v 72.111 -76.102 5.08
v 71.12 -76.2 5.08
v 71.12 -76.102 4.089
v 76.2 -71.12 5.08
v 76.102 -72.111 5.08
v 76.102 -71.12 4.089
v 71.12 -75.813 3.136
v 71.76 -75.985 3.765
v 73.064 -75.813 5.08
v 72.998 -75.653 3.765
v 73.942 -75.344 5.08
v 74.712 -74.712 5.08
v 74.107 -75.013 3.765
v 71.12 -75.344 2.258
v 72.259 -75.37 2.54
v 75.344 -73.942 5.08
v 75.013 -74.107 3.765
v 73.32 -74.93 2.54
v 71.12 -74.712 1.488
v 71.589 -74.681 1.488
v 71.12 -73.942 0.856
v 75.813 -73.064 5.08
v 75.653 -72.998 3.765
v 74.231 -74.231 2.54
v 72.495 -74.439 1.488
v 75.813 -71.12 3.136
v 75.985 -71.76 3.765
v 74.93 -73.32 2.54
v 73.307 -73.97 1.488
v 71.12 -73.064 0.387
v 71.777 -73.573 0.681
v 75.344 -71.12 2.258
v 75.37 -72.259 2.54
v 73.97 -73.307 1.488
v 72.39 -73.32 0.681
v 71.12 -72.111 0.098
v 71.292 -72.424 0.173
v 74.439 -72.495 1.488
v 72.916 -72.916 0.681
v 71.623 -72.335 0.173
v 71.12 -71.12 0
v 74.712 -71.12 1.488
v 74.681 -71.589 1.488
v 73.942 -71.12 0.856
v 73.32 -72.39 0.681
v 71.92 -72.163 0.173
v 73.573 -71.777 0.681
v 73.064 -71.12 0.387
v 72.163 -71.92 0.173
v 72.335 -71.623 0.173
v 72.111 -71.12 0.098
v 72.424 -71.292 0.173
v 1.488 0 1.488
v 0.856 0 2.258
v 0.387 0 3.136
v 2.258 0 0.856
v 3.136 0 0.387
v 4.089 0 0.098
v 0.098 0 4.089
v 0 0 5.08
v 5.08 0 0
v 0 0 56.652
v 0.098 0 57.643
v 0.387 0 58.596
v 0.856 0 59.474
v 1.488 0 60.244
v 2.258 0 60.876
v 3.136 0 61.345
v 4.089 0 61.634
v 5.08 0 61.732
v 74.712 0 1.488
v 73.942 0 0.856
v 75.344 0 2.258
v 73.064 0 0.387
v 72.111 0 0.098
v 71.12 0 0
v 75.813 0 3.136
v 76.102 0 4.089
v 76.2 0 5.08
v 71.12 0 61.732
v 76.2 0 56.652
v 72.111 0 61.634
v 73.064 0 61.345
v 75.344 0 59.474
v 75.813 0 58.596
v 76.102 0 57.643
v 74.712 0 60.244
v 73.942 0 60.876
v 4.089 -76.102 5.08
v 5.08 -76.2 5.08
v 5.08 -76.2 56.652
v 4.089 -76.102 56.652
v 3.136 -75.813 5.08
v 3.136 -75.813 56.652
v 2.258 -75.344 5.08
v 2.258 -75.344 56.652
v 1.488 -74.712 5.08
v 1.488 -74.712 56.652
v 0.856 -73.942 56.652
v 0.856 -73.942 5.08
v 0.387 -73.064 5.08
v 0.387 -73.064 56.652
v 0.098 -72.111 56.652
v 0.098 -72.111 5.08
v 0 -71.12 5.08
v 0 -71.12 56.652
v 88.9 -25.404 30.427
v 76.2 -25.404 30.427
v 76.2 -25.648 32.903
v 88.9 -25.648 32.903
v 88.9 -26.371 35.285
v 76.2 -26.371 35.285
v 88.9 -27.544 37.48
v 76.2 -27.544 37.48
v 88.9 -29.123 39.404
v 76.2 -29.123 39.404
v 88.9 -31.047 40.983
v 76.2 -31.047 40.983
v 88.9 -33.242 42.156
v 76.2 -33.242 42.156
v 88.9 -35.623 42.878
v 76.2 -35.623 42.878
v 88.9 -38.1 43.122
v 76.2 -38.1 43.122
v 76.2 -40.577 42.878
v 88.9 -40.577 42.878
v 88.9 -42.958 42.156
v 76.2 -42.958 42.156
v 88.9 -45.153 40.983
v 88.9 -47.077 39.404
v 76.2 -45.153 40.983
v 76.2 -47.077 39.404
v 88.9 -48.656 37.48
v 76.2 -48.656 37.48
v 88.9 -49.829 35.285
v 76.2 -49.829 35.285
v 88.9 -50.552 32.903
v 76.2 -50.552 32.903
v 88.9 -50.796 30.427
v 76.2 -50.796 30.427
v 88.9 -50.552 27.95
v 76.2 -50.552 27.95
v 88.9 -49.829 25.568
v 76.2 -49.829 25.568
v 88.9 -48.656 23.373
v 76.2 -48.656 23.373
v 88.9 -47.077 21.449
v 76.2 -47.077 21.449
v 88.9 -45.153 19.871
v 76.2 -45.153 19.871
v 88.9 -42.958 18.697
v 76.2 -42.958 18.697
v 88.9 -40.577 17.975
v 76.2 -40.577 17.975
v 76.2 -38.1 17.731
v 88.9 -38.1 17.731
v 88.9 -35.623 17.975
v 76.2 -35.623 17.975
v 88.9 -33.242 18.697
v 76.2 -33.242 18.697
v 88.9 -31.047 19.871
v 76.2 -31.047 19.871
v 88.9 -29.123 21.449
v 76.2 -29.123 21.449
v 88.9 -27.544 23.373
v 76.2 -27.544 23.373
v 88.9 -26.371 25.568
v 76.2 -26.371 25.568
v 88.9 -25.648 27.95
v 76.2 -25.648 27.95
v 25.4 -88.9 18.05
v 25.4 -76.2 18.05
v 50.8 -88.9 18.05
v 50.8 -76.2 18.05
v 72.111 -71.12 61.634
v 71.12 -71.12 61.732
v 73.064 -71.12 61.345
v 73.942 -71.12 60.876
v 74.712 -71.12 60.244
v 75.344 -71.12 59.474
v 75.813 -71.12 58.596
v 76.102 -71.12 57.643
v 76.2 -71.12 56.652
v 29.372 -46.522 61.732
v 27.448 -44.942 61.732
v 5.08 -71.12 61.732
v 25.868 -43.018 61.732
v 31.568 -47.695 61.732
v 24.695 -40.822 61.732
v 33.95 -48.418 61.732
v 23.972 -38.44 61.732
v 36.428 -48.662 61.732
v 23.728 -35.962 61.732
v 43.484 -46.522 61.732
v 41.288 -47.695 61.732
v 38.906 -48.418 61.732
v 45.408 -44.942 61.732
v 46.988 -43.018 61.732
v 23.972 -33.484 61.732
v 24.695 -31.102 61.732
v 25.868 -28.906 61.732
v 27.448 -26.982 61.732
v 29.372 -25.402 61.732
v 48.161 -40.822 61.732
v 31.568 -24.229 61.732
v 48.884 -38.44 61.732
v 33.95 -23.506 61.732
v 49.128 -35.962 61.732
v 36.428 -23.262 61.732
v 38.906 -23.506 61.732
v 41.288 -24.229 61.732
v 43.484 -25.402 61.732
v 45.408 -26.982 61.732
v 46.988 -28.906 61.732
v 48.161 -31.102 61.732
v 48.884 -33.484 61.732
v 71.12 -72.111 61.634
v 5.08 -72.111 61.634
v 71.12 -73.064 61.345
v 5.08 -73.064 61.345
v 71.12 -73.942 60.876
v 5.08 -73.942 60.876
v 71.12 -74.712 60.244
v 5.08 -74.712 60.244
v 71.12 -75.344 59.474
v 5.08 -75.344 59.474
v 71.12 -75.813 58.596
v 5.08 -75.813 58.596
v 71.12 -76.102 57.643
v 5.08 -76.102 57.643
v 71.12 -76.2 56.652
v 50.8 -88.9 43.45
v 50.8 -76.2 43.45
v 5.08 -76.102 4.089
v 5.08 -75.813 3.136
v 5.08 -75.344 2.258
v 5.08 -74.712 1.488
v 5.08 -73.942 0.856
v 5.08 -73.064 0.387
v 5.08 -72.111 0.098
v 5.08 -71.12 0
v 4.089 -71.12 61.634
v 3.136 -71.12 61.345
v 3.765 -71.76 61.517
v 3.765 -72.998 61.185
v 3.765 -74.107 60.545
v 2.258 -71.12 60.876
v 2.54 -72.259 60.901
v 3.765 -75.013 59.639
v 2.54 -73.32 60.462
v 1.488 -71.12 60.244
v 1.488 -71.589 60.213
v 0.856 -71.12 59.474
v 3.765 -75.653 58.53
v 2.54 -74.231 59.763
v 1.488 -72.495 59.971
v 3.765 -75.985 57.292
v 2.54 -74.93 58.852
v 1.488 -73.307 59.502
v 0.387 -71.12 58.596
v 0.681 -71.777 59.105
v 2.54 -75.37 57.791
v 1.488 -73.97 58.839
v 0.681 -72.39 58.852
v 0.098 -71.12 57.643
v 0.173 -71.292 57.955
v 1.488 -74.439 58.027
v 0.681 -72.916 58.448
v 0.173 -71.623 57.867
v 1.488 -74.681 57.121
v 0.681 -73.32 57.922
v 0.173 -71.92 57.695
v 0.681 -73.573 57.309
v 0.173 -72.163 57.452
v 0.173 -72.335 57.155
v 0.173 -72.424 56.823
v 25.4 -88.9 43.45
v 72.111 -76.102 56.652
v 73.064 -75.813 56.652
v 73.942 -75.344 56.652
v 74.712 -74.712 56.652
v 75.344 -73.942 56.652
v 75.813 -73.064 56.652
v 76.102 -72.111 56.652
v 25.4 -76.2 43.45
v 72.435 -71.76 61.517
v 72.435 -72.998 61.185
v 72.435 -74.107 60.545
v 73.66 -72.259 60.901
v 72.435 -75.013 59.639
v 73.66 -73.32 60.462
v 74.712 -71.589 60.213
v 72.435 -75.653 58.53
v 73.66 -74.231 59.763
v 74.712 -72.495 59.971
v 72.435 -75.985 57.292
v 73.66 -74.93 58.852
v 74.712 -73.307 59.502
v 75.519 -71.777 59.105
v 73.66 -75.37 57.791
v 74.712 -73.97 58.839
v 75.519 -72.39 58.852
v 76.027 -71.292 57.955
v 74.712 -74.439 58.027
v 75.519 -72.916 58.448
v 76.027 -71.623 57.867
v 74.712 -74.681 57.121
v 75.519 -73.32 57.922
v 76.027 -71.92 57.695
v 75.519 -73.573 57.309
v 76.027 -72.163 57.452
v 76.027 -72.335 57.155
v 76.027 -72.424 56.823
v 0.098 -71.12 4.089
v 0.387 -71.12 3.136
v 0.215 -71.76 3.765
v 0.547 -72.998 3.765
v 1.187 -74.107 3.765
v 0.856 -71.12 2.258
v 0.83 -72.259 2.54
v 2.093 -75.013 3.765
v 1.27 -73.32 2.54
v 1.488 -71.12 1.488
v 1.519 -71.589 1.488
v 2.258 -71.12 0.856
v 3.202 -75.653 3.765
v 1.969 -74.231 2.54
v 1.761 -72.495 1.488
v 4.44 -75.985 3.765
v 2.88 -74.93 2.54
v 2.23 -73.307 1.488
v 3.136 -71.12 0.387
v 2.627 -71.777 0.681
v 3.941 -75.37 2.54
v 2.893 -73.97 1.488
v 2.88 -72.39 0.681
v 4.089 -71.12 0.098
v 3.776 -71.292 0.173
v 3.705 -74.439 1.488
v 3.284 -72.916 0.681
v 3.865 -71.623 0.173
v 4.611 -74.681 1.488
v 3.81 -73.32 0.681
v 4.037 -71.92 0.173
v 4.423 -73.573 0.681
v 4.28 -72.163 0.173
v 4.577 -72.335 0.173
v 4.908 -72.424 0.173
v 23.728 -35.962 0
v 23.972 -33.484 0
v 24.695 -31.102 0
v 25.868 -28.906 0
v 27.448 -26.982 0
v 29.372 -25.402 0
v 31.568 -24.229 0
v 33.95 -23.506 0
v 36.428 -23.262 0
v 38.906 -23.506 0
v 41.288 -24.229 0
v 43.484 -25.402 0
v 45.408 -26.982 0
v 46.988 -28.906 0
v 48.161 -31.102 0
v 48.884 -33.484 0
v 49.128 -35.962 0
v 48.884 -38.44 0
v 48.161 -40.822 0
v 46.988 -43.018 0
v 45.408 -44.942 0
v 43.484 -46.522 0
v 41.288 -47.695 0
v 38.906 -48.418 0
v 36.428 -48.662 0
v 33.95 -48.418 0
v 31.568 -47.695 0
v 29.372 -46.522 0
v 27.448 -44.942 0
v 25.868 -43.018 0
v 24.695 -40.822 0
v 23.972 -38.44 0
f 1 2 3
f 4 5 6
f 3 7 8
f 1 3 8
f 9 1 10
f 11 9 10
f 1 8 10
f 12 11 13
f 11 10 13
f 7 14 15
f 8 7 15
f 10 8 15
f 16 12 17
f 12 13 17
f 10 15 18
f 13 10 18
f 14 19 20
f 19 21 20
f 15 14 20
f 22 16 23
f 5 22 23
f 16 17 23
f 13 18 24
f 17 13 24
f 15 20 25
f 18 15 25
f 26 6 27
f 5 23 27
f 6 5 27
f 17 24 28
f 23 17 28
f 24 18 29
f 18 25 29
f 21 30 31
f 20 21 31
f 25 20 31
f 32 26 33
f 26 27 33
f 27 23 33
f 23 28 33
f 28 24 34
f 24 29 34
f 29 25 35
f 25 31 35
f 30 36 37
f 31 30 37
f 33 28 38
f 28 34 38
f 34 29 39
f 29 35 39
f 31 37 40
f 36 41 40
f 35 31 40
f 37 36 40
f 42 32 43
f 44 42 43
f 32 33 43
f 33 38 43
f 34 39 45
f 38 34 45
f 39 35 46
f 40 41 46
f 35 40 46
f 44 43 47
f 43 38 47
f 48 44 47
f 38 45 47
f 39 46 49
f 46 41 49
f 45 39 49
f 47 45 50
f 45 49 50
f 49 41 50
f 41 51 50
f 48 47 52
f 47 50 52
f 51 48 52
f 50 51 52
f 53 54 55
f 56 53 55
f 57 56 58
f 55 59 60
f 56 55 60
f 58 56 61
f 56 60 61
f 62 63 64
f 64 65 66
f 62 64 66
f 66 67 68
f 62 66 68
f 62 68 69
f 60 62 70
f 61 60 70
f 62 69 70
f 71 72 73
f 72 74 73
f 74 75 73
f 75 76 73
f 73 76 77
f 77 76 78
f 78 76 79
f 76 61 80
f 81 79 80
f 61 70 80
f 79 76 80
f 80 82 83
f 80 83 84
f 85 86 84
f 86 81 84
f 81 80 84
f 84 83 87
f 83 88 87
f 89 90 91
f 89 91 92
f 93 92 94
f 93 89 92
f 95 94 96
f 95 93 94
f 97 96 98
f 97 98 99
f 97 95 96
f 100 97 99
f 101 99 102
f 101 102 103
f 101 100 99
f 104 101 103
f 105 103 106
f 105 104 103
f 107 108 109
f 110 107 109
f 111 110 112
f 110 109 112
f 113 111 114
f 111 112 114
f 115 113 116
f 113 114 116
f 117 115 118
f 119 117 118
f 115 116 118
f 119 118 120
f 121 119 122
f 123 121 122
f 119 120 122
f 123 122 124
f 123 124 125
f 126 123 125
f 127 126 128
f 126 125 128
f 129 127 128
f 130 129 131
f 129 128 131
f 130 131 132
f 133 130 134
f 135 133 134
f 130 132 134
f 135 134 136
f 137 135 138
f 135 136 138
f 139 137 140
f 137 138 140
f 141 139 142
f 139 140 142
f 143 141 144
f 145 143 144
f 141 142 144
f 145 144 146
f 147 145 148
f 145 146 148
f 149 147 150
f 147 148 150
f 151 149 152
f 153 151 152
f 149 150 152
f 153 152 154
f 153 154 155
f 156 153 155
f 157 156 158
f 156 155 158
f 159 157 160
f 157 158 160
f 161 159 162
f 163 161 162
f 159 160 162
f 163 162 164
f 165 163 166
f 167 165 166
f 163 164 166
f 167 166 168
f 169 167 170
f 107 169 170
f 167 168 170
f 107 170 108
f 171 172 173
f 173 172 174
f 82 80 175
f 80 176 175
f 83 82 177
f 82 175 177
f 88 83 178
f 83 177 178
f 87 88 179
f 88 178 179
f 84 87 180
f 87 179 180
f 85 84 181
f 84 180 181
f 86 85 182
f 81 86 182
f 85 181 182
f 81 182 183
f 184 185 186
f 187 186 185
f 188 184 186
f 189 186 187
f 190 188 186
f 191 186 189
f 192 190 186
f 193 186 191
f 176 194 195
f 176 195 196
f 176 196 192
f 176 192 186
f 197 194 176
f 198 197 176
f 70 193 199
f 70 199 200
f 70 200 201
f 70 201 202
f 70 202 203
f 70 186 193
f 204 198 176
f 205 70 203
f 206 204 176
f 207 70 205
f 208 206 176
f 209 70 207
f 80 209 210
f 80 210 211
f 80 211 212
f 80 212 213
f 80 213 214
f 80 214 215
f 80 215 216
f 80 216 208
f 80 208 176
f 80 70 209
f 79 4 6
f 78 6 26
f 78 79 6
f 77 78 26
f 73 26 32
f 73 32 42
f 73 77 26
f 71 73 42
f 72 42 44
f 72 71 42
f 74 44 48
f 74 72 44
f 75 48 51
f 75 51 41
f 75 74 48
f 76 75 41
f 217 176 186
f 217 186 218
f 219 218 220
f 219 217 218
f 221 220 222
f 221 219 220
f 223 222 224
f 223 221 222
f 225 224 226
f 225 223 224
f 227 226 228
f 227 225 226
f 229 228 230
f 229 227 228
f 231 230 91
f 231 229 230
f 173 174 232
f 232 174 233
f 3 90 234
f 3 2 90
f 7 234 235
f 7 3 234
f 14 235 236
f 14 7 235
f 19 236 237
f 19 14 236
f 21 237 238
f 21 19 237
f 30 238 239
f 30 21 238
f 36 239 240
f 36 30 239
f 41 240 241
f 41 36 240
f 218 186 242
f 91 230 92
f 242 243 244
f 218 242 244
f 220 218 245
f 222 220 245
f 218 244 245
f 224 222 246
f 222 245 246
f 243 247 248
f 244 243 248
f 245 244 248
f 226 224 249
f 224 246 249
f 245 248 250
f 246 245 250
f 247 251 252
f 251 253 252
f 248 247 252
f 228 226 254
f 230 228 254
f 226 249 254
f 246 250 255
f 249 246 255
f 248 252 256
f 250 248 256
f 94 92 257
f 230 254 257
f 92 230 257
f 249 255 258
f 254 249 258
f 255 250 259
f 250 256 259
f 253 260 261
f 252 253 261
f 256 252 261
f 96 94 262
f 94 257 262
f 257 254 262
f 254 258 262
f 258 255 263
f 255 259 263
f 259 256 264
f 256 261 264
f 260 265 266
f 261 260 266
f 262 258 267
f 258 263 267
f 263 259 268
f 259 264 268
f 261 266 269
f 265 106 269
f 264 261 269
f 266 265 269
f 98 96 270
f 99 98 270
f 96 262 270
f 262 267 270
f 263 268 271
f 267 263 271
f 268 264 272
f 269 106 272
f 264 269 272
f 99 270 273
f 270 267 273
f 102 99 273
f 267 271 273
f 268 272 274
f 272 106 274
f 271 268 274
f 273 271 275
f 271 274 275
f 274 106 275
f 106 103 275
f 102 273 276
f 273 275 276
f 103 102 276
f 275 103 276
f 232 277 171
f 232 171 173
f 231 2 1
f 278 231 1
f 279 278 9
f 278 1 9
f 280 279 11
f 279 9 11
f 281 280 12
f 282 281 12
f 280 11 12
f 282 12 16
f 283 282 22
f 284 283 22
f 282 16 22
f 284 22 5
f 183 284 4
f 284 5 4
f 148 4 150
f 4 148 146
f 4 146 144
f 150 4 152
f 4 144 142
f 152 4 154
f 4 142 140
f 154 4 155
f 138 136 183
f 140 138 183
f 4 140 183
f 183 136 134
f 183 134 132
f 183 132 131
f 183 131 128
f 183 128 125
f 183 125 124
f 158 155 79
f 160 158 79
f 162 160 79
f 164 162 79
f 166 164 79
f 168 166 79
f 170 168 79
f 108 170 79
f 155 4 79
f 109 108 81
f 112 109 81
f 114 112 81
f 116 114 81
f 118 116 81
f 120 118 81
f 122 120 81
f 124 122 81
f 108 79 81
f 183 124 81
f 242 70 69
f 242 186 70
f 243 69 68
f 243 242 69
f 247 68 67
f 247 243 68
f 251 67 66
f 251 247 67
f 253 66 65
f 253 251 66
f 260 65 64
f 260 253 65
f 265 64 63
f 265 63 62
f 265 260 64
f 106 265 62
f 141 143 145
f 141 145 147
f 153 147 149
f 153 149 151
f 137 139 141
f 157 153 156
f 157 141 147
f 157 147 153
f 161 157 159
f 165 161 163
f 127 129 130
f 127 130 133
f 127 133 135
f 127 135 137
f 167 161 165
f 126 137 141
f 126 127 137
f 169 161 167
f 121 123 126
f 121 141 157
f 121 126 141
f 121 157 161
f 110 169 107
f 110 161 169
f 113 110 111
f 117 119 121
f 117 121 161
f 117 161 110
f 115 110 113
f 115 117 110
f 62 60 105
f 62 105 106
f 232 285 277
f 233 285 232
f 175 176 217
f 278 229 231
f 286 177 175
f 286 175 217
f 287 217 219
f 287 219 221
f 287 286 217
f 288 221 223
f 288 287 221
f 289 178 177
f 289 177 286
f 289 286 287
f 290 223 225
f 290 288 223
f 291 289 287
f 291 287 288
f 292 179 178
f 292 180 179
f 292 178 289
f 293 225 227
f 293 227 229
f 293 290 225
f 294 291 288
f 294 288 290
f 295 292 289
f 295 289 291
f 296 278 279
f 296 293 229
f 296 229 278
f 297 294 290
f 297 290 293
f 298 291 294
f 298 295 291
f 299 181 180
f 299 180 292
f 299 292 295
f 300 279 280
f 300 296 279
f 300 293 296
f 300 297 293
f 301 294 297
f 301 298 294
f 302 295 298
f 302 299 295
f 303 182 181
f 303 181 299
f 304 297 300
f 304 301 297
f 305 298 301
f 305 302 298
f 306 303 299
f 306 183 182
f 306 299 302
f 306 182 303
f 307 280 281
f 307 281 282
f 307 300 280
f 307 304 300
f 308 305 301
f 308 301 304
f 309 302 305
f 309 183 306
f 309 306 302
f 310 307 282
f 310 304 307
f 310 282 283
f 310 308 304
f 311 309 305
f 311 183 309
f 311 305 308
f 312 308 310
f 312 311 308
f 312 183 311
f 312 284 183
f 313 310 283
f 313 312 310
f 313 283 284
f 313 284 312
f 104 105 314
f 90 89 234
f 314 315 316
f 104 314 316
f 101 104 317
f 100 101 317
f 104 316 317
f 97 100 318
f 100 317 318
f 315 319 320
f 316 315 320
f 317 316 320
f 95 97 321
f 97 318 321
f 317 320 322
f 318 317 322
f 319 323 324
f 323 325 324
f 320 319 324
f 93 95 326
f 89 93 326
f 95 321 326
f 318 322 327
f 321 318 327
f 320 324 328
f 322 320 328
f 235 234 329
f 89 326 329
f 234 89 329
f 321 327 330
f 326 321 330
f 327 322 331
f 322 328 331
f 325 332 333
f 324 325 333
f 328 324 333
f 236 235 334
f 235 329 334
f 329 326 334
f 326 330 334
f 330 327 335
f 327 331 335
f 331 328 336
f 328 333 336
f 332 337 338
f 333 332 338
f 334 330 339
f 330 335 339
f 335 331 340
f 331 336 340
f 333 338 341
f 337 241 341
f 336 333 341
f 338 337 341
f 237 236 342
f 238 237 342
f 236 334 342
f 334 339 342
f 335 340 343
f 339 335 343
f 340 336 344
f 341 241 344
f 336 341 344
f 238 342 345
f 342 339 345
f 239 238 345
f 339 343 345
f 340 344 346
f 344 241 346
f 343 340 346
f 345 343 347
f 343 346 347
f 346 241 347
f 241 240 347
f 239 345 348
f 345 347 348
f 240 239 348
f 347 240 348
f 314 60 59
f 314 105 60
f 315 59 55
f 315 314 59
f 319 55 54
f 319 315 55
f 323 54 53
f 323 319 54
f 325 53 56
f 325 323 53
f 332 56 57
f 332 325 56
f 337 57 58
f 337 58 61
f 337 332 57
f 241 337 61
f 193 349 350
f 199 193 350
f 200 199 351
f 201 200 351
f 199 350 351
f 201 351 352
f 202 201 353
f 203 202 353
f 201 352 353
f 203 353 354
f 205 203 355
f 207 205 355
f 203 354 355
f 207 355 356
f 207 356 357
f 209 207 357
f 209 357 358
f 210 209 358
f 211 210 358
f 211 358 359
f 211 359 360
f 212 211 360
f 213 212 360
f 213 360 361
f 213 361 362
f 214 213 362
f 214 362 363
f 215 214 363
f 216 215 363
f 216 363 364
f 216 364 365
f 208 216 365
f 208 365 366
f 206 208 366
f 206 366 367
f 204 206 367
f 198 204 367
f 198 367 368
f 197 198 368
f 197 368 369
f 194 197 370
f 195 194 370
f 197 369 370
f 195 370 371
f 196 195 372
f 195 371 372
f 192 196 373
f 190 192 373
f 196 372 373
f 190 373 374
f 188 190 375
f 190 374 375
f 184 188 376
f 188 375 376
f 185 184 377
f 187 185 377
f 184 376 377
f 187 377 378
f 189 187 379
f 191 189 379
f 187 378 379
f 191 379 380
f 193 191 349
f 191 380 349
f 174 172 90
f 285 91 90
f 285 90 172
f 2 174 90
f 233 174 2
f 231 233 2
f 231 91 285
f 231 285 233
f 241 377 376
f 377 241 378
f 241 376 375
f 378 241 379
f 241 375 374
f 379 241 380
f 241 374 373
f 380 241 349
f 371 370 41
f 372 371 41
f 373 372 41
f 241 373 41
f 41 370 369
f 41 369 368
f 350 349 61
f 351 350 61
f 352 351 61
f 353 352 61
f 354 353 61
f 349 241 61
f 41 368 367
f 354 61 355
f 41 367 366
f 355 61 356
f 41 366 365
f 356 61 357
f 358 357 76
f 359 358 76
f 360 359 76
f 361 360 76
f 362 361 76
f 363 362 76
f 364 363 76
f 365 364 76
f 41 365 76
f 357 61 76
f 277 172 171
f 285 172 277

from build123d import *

# Parameters (mm, degrees)
F0_W     = 76.2
F0_H     = 61.731871
F1_DEPTH = 76.2
F4_R     = 12.695575
F5_DEPTH = 12.7
F7_W     = 25.4
F7_H     = 25.4
F8_DEPTH = 12.7
F10_D    = 25.4
F11_R    = 5.08
F12_R    = 5.08
F13_R    = 5.08
F14_R    = 5.08


with BuildPart() as f1:
    # F0 (on Front) → F1 (new body)
    with BuildSketch(Plane.XZ):
        with Locations((38.1, 30.865935)):
            Rectangle(F0_W, F0_H)
    extrude(amount=F1_DEPTH)

    # F4 (on face) → F5 (join)
    with BuildSketch(Plane.YZ.offset(76.2)):
        with Locations((-38.1, 30.42659)):
            Circle(F4_R)
    extrude(amount=F5_DEPTH)

    # F7 (on face) → F8 (join)
    with BuildSketch(Plane.XZ.offset(76.2)):
        with Locations((38.1, 30.749847)):
            Rectangle(F7_W, F7_H)
    extrude(amount=F8_DEPTH)

    # F10 (through all)
    with Locations(Plane.XY.offset(61.731871)):
        with Locations((36.42799, -35.96206)):
            Hole(F10_D / 2)

    # F11
    f11_edges = [f1.edges().sort_by_distance(p)[0] for p in [
        (38.1, -76.2, 61.731871),
    ]]
    fillet(f11_edges, radius=F11_R)

    # F12
    f12_edges = [f1.edges().sort_by_distance(p)[0] for p in [
        (76.2, -35.56, 61.731871),
    ]]
    fillet(f12_edges, radius=F12_R)

    # F13
    f13_edges = [f1.edges().sort_by_distance(p)[0] for p in [
        (0, -35.56, 61.731871),
    ]]
    fillet(f13_edges, radius=F13_R)

    # F14
    f14_edges = [f1.edges().sort_by_distance(p)[0] for p in [
        (38.1, -76.2, 0),
    ]]
    fillet(f14_edges, radius=F14_R)


solid = f1.part
